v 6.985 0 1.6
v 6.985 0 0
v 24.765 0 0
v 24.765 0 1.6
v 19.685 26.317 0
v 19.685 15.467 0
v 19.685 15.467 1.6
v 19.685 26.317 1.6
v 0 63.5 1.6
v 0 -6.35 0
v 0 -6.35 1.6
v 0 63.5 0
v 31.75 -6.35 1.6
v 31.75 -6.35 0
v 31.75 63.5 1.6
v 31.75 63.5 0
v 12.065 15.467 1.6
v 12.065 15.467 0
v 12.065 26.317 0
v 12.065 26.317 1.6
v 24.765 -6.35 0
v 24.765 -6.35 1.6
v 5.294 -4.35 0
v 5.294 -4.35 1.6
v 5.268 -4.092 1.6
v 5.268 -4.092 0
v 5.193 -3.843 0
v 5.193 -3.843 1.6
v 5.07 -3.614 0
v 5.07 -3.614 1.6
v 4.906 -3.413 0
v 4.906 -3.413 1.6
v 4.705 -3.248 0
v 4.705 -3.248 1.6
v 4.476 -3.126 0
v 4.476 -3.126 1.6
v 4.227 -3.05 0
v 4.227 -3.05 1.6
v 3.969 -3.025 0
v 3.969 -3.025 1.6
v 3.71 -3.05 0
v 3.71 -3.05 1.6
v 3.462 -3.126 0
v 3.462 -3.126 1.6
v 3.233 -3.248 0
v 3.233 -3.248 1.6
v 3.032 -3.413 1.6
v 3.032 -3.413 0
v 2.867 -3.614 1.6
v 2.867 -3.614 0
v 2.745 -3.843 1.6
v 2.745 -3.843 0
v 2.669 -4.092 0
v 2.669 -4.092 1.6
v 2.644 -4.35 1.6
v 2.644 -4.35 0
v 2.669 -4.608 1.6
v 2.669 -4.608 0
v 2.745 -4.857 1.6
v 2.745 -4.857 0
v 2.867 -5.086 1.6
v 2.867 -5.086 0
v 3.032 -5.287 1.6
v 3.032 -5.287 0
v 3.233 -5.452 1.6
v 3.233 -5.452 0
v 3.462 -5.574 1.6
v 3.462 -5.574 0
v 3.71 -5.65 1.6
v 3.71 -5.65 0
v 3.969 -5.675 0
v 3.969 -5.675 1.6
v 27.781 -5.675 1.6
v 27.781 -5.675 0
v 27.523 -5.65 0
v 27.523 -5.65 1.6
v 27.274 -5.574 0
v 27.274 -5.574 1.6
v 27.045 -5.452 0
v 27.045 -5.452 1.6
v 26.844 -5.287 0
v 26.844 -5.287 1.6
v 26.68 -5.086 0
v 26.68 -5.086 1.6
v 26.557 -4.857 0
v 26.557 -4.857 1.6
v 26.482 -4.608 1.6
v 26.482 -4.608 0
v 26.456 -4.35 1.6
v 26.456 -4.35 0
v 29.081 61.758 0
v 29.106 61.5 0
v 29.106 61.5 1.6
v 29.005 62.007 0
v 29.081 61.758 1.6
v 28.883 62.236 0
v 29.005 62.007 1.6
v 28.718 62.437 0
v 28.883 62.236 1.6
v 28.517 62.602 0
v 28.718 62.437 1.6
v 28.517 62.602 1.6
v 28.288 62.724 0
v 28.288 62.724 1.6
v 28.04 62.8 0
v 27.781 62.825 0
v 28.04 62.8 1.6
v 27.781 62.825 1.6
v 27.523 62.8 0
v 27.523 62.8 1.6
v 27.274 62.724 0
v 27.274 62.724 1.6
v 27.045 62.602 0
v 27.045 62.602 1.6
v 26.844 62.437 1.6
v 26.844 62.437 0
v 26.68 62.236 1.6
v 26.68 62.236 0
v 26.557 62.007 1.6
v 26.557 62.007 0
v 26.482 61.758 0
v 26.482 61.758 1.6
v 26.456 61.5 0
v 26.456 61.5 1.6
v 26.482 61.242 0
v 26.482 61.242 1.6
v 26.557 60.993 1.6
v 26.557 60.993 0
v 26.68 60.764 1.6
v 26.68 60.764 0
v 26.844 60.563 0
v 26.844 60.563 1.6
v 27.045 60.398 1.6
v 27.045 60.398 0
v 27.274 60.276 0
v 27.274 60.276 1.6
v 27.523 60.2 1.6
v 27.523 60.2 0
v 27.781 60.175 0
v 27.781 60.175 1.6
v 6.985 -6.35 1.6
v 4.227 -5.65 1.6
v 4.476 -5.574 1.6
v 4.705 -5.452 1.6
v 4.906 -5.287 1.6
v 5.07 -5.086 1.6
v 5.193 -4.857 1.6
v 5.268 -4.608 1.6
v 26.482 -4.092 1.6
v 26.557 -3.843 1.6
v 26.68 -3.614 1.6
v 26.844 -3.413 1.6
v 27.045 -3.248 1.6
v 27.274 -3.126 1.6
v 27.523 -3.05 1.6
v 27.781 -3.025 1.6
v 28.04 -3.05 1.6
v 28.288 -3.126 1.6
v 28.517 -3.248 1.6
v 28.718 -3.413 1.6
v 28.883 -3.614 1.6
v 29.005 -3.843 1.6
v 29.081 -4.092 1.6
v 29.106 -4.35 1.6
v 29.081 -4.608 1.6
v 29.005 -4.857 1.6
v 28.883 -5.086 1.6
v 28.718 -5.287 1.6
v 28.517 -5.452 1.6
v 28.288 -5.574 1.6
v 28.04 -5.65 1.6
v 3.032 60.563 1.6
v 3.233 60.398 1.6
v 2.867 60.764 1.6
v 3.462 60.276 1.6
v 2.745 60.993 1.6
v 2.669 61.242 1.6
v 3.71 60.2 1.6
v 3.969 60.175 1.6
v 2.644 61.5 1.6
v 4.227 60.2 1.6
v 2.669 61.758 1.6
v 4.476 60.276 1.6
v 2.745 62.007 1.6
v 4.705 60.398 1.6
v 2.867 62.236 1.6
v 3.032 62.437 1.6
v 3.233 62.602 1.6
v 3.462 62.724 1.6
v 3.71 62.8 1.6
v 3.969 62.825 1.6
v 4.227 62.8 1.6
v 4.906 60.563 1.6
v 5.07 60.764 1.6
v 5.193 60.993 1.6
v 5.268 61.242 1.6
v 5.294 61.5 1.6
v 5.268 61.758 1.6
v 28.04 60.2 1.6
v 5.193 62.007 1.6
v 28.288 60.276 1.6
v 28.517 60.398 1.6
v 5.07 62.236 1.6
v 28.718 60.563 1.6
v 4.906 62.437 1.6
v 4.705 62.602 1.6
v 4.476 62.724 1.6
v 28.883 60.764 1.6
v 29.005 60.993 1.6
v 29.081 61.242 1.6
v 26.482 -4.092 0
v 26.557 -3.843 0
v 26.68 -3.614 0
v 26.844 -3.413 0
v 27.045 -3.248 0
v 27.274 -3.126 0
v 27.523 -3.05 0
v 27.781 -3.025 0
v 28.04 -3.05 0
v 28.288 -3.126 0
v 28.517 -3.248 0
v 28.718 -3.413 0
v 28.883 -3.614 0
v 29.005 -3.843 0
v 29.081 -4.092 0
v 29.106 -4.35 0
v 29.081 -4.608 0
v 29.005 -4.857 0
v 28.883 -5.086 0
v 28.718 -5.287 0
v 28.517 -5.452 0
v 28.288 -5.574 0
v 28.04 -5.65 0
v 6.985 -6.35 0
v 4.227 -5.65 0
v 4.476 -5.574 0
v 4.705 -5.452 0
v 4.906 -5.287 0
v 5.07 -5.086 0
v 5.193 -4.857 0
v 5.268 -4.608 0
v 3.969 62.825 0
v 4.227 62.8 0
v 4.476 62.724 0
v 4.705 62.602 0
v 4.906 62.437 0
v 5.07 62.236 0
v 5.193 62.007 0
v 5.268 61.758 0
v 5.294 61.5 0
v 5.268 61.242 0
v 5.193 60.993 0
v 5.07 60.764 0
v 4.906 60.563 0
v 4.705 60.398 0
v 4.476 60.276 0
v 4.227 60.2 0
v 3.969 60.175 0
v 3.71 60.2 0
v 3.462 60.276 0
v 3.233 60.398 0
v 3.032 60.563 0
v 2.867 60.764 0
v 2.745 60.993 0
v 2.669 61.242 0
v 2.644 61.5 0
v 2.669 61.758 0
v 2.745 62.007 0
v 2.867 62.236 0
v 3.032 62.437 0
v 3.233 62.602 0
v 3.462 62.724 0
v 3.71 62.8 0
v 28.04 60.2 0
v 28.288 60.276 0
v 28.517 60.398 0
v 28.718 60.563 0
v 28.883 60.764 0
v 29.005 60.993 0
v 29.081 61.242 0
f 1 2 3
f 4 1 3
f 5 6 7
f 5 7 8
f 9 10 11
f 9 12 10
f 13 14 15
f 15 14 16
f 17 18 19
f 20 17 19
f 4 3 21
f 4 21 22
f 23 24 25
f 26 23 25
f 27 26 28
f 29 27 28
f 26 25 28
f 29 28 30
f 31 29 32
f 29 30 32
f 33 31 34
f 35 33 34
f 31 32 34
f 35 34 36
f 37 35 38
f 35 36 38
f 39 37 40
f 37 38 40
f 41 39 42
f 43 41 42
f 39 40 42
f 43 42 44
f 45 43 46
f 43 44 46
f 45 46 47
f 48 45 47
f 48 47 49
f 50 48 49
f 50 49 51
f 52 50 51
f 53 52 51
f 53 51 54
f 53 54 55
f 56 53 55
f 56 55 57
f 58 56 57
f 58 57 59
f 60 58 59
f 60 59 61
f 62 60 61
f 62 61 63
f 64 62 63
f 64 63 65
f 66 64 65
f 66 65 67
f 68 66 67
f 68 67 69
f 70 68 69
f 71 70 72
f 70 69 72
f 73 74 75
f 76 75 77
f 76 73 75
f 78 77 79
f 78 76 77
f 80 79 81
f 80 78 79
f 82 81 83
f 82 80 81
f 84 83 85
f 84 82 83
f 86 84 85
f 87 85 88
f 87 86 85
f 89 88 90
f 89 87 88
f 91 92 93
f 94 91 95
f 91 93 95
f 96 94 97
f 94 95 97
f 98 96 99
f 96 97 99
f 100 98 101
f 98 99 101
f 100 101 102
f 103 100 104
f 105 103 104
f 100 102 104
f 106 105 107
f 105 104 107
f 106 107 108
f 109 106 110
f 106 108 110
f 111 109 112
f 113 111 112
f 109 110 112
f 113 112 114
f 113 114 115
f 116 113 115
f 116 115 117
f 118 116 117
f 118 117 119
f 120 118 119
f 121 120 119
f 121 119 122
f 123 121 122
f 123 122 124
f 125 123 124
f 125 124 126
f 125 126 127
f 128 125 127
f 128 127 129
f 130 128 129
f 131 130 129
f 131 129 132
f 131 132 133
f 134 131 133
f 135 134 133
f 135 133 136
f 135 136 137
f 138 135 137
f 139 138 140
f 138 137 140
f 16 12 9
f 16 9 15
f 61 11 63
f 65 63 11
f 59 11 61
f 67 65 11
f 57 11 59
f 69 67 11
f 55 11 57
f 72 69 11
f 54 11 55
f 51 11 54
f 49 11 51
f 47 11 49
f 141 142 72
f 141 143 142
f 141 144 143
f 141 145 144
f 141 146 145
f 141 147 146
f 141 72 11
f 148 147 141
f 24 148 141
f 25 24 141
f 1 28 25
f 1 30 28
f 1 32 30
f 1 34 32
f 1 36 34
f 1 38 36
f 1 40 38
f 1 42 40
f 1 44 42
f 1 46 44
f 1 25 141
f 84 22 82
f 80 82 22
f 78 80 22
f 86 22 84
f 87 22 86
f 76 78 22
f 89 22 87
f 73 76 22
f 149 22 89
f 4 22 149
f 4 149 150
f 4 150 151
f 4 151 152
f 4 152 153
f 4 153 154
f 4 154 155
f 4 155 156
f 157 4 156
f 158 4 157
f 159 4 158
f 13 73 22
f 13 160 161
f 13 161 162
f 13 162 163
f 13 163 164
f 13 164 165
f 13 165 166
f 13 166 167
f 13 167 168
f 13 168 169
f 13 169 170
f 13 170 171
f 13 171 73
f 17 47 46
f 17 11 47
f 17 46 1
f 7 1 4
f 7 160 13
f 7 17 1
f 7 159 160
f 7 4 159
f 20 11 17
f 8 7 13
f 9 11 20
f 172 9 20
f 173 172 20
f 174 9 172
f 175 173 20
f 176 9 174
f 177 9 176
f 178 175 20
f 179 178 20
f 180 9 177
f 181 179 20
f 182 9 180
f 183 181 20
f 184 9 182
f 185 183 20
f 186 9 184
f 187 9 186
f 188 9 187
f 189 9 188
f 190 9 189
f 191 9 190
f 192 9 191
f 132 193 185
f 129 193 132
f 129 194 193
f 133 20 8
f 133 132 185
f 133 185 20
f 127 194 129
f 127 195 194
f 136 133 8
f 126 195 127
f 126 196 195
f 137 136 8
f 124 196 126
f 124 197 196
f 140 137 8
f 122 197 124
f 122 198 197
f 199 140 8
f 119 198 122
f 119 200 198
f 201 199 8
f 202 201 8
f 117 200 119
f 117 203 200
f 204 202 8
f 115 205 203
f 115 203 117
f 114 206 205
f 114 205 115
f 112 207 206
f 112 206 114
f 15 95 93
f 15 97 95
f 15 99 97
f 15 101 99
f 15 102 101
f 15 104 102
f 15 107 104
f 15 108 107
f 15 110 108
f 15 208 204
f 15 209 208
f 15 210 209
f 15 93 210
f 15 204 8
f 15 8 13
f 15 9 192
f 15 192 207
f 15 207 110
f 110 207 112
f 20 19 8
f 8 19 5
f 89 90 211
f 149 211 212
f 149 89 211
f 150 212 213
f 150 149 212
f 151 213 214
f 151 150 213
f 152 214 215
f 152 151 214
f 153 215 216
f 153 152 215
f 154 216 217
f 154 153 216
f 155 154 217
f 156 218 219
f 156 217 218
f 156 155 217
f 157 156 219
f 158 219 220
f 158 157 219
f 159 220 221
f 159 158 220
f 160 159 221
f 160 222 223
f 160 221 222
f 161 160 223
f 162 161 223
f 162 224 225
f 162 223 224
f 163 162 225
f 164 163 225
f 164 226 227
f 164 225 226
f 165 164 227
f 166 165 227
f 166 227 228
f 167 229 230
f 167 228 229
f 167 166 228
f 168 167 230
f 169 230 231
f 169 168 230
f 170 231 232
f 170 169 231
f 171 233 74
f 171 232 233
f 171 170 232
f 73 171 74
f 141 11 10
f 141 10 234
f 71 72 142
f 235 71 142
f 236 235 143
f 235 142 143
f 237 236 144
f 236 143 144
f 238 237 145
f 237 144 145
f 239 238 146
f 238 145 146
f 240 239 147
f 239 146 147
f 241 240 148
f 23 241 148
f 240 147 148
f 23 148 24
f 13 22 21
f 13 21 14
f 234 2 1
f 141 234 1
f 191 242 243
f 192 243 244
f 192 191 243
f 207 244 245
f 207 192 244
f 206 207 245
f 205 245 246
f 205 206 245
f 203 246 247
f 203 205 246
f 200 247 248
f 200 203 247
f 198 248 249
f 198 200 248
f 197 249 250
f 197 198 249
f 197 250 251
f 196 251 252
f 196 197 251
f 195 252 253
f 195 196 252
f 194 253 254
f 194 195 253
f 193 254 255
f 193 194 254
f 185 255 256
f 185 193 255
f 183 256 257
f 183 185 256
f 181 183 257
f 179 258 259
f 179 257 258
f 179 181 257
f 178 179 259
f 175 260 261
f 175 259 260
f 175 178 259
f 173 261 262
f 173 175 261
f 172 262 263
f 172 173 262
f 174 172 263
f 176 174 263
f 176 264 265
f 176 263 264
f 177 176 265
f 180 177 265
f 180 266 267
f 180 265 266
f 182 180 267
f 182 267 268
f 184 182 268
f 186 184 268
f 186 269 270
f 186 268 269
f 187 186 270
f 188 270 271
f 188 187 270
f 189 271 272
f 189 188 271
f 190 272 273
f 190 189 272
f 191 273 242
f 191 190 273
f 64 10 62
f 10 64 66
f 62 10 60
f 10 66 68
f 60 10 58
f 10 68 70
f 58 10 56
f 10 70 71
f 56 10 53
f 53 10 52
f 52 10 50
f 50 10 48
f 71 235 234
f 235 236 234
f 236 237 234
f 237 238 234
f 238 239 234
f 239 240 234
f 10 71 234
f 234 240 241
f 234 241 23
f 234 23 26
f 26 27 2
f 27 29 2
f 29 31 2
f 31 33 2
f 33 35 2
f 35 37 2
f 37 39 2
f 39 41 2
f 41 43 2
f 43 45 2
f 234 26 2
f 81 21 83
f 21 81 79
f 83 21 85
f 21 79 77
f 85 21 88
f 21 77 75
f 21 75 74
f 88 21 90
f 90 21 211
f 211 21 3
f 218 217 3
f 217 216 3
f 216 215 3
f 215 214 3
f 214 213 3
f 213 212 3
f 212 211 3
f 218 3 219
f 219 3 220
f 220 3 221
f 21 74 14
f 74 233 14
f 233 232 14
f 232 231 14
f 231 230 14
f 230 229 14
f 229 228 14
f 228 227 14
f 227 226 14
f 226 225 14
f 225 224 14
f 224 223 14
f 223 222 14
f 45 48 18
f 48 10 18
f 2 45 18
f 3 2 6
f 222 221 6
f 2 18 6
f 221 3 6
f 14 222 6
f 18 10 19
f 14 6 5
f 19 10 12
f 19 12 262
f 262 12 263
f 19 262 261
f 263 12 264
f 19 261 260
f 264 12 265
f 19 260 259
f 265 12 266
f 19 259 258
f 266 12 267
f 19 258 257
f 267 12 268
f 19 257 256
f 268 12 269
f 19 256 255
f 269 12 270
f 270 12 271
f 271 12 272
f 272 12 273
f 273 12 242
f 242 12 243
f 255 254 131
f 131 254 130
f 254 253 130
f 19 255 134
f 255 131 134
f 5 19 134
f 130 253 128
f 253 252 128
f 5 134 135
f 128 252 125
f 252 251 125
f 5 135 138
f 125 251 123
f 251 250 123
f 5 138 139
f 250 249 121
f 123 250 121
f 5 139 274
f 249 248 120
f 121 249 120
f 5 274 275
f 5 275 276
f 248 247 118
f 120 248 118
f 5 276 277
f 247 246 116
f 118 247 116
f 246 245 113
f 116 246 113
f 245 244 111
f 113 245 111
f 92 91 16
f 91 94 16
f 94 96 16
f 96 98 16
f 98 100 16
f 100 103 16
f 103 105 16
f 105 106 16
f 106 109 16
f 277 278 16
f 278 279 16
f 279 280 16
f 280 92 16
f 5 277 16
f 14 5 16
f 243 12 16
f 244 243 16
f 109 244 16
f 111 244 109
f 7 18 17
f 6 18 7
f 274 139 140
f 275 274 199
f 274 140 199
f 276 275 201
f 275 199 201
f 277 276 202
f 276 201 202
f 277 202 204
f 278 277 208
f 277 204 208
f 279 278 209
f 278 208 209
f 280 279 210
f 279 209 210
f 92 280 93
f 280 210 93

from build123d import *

# Parameters (mm, degrees)
F0_W             = 31.75
F0_H             = 63.5
F0_W_2           = 7.62
F0_H_2           = 10.8501603827
F1_DEPTH         = 1.6
F2_W             = 6.985
F2_H             = 1.6
F3_DEPTH         = 6.35
F5_DEPTH         = 25.4
F5_COPIES2_COUNT = 2
F5_COPIES2_PITCH = 70.023265


# Not quite as in the source:
# - a feature of the source that left no trace in its solid (it failed there, or was rolled back) is left out
# - a pattern or mirror of a feature is missing from the dataset's text; its kind, count and spacing are read off the source's solid
# - a feature names something its author has since deleted; it is built from what else it names


with BuildPart() as f1:
    # F0 (on Top) → F1 (new body)
    with BuildSketch(Plane.XY):
        with Locations((15.875, 31.75)):
            Rectangle(F0_W, F0_H)
        with Locations((15.875, 20.8916743286)):
            Rectangle(F0_W_2, F0_H_2, mode=Mode.SUBTRACT)
    extrude(amount=F1_DEPTH)

    # F2 (on face) → F3 (join)
    with BuildSketch(Plane.XZ):
        with Locations((3.4925, 0.8)):
            Rectangle(F2_W, F2_H)
        with Locations((28.2575, 0.8)):
            Rectangle(F2_W, F2_H)
    extrude(amount=F3_DEPTH)

    # F4 (on face) → F5 (cut)
    with BuildSketch(Plane.XY.offset(1.6)):
        with BuildLine():
            ThreePointArc((5.29375, -4.35), (3.0318335149, -3.4130835149), (3.96875, -5.675))
            Line((3.96875, -5.675), (3.96875, -4.35))
            Line((3.96875, -4.35), (5.29375, -4.35))
        make_face()
        with BuildLine():
            Line((3.96875, -4.35), (3.96875, -5.675))
            ThreePointArc((3.96875, -5.675), (4.9056664851, -5.2869164851), (5.29375, -4.35))
            Line((5.29375, -4.35), (3.96875, -4.35))
        make_face()
    f5 = extrude(amount=-F5_DEPTH, mode=Mode.SUBTRACT)

    # F5_copies: F5 across plane
    add(f5.mirror(Plane.ZX.offset(28.575)), mode=Mode.SUBTRACT)

    # F5_copies1: F5 across plane
    add(f5.mirror(Plane(origin=(15.875, 0, 0), x_dir=(0, 0, 1), z_dir=(1, 0, 0))), mode=Mode.SUBTRACT)

    # F5_copies2: F5 ×2
    with Locations(*[Vector(0.3400655477, 0.940401735, 0) * (i * F5_COPIES2_PITCH) for i in range(1, F5_COPIES2_COUNT)]):
        add(f5, mode=Mode.SUBTRACT)


solid = f1.part
